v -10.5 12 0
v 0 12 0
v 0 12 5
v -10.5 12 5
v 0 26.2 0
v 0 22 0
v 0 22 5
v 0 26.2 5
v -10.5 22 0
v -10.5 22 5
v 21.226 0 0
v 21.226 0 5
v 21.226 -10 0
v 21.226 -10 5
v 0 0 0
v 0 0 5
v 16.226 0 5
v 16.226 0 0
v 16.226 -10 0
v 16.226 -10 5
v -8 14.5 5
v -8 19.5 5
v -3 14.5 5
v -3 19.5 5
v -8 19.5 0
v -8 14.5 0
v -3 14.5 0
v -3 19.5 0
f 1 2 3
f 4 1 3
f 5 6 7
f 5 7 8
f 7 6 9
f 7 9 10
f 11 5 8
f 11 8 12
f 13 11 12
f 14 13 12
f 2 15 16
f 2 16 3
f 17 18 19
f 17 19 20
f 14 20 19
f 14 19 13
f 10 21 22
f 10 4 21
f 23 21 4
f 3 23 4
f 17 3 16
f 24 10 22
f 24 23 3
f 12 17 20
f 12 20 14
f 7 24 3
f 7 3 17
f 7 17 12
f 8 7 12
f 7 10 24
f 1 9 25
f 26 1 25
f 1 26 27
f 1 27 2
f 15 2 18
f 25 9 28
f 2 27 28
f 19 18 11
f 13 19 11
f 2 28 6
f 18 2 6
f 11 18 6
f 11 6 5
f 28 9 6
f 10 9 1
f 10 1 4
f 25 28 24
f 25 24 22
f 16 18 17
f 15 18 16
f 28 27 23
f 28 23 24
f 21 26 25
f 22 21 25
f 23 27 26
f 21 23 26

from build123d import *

# Parameters (mm, degrees)
BOSS_EXTRU_1_DEPTH      = 5
ESQUISSE3_W             = 5
ESQUISSE3_H             = 5
BOSS_EXTRU_3_DEPTH      = 10
ESQUISSE2_W             = 5
ESQUISSE2_H             = 10
BOSS_EXTRU_5_DEPTH      = 10.5
ESQUISSE4_W             = 5
ESQUISSE4_H             = 5
ENL_V_MAT_EXTRU_1_DEPTH = 10


with BuildPart() as part:
    # Esquisse1 → Boss.-Extru.1 (new body)
    with BuildSketch(Plane.XY):
        Polygon((0, 0), (0, 26.2), (21.226398658, 0), align=None)
    extrude(amount=BOSS_EXTRU_1_DEPTH)

    # Esquisse3 → Boss.-Extru.3 (add)
    with BuildSketch(Plane.XZ):
        with Locations((18.726398658, 2.5)):
            Rectangle(ESQUISSE3_W, ESQUISSE3_H)
    extrude(amount=BOSS_EXTRU_3_DEPTH)

    # Esquisse2 → Boss.-Extru.5 (add)
    with BuildSketch(Plane.ZY):
        with Locations((2.5, 17)):
            Rectangle(ESQUISSE2_W, ESQUISSE2_H)
    extrude(amount=BOSS_EXTRU_5_DEPTH)

    # Esquisse4 → Enlèv. mat.-Extru.1 (cut)
    with BuildSketch(Plane(origin=(0, 0, 0), x_dir=(-1, 0, 0), z_dir=(0, 0, -1))):
        with Locations((5.5, 17)):
            Rectangle(ESQUISSE4_W, ESQUISSE4_H)
    extrude(amount=-ENL_V_MAT_EXTRU_1_DEPTH, mode=Mode.SUBTRACT)


solid = part.part
